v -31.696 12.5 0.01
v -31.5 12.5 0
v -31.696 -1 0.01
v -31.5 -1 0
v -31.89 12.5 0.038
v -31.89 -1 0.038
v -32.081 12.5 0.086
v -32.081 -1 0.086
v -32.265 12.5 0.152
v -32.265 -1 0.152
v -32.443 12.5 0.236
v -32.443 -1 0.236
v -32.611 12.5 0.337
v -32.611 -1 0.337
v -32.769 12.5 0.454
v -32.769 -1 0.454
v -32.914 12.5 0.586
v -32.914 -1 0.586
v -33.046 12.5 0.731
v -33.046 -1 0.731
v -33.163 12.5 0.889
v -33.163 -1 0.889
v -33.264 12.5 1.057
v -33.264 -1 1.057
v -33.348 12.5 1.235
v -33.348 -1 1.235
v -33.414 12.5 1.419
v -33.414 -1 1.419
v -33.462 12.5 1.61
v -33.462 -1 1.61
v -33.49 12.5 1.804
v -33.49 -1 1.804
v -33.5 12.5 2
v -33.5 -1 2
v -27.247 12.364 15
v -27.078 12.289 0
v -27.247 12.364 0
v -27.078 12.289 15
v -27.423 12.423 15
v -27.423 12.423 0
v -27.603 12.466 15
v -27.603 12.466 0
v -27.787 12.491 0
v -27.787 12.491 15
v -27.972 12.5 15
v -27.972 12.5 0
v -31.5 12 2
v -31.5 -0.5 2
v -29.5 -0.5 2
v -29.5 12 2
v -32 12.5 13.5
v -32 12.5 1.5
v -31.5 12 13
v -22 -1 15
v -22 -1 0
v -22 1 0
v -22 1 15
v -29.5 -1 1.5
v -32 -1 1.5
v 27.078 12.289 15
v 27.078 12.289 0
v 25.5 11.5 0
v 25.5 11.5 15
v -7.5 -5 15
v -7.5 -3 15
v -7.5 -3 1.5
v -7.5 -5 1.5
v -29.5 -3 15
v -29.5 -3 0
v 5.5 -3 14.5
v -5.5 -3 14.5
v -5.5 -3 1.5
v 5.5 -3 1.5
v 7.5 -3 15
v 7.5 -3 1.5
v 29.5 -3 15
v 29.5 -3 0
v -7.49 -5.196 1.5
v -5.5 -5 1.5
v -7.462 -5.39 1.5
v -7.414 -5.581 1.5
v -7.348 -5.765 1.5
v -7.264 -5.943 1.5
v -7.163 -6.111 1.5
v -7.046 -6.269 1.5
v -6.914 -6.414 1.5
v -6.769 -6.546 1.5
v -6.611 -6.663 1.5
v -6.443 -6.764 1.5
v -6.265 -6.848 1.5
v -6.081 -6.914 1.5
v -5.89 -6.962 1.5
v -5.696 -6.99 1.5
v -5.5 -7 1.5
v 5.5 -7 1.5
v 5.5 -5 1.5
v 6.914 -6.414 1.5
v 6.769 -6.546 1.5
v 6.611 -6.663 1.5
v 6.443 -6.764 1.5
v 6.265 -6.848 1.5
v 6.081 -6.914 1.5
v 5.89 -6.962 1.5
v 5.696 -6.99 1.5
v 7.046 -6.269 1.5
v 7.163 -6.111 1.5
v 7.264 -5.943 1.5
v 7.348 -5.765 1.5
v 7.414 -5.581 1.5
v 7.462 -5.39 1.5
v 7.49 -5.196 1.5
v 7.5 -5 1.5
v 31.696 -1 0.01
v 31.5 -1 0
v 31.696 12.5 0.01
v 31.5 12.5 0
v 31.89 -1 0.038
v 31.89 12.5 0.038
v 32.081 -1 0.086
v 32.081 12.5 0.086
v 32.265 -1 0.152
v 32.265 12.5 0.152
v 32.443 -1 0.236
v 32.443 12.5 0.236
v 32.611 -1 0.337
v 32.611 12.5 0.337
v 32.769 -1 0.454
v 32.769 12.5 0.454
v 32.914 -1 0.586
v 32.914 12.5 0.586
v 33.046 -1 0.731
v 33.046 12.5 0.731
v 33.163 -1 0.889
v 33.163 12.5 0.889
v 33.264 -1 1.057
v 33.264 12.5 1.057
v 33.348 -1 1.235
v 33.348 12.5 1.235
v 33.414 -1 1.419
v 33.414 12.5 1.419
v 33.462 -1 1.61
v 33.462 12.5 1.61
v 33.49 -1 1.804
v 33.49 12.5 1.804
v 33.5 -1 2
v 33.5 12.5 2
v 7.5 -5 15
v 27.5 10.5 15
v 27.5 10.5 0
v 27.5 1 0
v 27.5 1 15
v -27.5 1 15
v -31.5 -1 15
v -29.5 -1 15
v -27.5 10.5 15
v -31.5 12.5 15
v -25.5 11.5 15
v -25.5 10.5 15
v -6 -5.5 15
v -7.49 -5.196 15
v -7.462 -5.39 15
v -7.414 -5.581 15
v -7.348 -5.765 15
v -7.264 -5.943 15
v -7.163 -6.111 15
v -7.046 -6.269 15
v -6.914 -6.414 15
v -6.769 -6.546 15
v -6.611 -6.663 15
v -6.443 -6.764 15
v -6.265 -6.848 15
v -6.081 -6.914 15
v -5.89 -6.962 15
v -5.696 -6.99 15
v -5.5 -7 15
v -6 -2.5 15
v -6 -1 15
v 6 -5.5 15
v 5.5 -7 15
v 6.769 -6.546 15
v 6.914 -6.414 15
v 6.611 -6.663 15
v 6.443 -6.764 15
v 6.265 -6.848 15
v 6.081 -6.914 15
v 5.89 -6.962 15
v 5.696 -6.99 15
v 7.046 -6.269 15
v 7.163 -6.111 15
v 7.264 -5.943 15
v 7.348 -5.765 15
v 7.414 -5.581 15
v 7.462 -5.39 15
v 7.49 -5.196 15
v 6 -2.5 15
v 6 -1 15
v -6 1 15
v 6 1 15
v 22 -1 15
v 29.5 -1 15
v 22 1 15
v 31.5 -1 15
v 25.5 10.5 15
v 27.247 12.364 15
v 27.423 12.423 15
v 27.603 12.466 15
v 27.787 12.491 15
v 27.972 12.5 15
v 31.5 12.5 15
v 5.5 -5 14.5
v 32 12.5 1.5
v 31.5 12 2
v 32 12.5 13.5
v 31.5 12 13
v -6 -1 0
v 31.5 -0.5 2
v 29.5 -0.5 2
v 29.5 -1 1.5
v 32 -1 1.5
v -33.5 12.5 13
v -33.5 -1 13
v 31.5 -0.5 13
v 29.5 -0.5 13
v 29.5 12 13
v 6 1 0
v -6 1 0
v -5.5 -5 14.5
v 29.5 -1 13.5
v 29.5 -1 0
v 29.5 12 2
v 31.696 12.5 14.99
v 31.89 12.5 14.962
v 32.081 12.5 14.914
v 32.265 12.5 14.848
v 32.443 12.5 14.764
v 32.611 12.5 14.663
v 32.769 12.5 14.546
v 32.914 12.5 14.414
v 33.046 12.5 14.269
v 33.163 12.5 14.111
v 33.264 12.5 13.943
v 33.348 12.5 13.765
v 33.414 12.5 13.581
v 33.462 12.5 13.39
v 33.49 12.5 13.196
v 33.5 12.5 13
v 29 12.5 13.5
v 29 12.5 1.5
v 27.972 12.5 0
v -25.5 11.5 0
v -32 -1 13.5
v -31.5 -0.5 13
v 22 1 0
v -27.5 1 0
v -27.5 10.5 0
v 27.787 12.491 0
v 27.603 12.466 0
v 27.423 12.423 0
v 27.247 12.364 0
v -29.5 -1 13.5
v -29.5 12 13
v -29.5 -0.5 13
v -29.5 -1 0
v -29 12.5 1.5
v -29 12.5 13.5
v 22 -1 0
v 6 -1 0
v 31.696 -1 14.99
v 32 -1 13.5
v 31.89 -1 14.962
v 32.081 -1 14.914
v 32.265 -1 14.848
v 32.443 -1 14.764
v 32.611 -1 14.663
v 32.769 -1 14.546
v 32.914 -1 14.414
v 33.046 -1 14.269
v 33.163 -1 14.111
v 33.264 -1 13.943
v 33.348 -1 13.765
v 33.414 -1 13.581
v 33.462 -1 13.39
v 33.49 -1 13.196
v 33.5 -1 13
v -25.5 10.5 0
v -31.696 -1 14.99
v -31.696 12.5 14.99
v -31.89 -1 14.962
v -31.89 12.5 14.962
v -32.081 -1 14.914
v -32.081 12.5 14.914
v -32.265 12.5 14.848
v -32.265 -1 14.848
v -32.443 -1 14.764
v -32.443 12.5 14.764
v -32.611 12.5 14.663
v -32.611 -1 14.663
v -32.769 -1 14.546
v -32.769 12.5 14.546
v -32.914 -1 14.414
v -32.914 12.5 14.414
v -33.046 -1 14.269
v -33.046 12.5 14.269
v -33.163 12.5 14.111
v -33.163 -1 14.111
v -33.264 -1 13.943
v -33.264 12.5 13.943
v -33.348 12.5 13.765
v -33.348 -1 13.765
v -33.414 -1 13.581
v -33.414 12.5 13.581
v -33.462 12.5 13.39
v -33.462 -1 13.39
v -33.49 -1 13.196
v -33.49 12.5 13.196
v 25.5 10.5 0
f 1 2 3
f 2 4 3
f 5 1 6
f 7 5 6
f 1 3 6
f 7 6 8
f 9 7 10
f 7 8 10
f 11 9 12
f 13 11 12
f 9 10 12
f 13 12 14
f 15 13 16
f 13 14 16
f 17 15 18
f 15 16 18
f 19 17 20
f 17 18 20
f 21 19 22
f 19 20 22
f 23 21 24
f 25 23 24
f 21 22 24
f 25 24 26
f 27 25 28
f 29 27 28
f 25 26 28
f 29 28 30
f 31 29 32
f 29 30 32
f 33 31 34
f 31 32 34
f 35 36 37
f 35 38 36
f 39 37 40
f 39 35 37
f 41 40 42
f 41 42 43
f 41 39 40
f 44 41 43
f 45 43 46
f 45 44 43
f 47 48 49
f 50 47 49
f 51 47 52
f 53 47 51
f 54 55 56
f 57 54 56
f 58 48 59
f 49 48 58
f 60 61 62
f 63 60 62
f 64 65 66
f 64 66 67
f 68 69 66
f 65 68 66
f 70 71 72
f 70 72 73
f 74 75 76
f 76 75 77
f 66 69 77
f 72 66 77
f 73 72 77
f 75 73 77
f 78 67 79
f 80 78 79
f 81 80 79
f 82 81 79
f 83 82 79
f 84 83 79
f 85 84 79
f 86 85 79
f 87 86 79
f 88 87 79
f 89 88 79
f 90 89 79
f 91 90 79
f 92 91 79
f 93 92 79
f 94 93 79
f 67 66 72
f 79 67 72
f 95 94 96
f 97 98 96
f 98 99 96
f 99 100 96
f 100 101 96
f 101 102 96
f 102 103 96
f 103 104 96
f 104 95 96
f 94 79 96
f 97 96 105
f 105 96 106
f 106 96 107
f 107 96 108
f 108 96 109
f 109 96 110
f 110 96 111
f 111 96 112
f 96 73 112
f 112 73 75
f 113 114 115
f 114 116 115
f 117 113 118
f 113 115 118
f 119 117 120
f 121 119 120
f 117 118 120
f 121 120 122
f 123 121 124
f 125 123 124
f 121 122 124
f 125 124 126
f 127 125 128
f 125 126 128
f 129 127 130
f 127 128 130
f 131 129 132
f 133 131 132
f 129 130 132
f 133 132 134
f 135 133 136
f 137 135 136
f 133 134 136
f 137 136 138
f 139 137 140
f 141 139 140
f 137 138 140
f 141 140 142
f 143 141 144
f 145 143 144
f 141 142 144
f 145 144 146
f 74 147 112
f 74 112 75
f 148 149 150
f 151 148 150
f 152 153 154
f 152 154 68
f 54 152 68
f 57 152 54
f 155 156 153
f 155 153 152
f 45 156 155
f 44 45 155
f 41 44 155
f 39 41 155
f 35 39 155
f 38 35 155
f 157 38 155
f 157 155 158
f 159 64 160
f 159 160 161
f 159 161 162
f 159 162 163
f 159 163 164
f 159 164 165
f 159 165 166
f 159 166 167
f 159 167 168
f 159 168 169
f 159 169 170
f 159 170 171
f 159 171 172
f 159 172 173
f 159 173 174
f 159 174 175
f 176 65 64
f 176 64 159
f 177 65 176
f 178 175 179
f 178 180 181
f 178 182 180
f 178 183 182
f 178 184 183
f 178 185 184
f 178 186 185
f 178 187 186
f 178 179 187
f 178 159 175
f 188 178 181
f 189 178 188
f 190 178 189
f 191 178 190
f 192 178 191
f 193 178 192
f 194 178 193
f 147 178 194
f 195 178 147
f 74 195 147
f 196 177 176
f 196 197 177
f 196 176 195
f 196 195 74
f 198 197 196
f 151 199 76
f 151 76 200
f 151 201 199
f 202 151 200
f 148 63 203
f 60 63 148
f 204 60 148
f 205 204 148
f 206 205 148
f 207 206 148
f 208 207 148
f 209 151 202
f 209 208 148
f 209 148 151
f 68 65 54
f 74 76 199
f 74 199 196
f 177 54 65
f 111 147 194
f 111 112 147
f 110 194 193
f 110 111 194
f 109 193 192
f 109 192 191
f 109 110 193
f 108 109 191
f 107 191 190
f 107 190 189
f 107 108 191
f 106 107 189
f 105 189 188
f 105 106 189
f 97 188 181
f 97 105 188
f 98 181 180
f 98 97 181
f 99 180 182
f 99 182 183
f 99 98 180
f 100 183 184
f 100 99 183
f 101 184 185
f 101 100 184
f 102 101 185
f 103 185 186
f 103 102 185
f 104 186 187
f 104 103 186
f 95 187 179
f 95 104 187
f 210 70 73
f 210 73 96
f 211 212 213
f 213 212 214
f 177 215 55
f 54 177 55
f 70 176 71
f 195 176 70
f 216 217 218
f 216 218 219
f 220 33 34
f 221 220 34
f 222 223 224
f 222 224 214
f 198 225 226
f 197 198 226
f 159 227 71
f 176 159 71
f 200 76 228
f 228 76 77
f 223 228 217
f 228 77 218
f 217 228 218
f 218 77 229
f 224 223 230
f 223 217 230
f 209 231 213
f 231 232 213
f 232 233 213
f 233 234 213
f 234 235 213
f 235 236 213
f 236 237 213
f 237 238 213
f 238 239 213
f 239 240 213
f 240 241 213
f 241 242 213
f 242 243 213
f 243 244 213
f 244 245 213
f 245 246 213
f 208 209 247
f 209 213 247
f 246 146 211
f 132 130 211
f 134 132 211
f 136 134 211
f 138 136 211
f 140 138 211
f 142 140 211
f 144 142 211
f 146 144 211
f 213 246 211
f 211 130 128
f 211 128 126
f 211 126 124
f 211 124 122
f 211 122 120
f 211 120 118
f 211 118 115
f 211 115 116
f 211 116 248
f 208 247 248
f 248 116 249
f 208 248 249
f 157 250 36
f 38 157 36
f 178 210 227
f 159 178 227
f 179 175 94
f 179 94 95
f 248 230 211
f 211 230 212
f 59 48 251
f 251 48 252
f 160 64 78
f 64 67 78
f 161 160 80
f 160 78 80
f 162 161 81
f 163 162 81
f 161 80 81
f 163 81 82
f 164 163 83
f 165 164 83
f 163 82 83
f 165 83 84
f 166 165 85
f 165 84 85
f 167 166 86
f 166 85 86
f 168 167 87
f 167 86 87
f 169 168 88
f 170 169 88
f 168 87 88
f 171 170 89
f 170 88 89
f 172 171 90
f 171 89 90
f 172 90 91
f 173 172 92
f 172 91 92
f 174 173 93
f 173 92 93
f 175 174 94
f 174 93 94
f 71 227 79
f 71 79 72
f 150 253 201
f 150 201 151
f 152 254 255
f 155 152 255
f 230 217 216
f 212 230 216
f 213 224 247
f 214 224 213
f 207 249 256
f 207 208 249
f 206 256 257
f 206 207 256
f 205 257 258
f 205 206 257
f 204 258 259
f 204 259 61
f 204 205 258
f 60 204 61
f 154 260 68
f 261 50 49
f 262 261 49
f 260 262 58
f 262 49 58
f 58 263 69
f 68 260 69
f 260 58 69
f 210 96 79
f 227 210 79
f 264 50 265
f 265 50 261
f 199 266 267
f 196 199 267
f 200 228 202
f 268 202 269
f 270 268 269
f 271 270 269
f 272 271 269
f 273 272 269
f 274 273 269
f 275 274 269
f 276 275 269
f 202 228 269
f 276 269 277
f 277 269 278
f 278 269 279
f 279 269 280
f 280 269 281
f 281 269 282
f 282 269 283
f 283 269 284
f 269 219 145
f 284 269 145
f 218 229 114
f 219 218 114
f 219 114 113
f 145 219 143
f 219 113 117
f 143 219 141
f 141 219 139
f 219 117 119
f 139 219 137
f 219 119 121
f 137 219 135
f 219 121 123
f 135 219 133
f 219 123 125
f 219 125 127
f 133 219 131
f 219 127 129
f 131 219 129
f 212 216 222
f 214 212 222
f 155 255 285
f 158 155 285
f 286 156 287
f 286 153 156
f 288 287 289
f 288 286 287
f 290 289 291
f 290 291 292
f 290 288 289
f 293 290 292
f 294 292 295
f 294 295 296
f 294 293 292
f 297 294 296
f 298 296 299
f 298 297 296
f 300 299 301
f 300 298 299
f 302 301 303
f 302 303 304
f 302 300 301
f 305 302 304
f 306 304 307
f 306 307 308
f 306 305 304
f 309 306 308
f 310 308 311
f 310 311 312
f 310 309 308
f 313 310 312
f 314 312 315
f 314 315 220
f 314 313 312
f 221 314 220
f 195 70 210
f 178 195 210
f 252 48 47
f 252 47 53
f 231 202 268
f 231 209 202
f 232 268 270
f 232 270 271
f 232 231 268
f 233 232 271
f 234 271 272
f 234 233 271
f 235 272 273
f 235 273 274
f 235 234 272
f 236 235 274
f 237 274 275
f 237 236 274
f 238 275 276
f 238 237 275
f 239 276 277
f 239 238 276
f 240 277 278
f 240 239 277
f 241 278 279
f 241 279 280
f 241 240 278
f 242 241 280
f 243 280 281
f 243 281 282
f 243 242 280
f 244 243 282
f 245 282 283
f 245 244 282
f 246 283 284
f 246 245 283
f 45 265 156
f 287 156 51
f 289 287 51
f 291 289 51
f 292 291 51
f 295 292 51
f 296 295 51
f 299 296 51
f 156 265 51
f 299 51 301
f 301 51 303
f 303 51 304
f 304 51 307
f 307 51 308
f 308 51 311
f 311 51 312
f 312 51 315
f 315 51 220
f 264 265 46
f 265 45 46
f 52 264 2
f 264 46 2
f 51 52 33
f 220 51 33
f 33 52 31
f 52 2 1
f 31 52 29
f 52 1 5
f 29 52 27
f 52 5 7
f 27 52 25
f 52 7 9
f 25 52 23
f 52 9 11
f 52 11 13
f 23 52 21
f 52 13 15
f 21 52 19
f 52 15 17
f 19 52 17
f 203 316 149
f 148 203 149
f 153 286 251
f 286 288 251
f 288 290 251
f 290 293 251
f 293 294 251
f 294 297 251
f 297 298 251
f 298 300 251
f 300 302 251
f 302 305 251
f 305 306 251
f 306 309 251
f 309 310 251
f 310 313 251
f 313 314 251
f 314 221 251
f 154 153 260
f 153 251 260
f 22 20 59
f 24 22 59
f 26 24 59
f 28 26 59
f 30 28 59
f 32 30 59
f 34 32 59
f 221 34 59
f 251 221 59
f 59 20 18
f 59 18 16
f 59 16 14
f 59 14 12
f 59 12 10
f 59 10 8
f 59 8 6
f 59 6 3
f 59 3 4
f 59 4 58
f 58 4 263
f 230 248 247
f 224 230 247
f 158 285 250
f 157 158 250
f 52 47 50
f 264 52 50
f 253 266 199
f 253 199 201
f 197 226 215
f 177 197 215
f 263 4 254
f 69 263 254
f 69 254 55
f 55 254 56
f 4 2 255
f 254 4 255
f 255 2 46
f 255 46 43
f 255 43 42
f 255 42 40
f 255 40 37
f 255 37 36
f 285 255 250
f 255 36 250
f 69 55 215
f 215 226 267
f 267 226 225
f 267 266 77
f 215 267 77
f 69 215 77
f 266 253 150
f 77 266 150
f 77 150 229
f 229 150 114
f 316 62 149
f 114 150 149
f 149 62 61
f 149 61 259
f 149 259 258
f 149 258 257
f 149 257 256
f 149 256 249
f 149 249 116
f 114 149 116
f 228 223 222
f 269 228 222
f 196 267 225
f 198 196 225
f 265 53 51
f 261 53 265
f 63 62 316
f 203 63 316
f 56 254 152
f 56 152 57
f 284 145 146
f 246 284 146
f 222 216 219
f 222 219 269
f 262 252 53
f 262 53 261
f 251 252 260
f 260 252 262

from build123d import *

# Parameters (mm, degrees)
F0_W     = 5.5
F0_H     = 2
F1_DEPTH = 15
F2_W     = 2
F2_H     = 11
F3_DEPTH = 13.501
F4_W     = 2
F4_H     = 2
F5_DEPTH = 13.5
F6_R     = 2
F7_SIZE  = 0.5


with BuildPart() as f1:
    # F0 (on Top) → F1 (new body)
    with BuildSketch(Plane.XY):
        Polygon((29.5, -1), (27.5, -1), (22, -1), (6, -1), (0, -1), (0, -3), (29.5, -3), align=None)
        with Locations((24.75, 0)):
            Rectangle(F0_W, F0_H)
        Polygon((27.5, 1), (27.5, -1), (29.5, -1), (29.5, 10.5), (27.5, 10.5), align=None)
        Polygon((29.5, 10.5), (29.5, -1), (33.5, -1), (33.5, 12.5), (29.5, 12.5), align=None)
        Polygon((0, -1), (6, -1), (6, 1), (-6, 1), (-6, -1), align=None)
        Polygon((25.5, 10.5), (27.5, 10.5), (29.5, 10.5), (29.5, 12.5), (27.5, 12.5), (25.5, 11.5), align=None)
        Polygon((0, -3), (0, -1), (-6, -1), (-22, -1), (-27.5, -1), (-29.5, -1), (-29.5, -3), align=None)
        with Locations((-24.75, 0)):
            Rectangle(F0_W, F0_H)
        Polygon((-29.5, 10.5), (-29.5, -1), (-27.5, -1), (-27.5, 1), (-27.5, 10.5), align=None)
        Polygon((-33.5, -1), (-29.5, -1), (-29.5, 10.5), (-29.5, 12.5), (-33.5, 12.5), align=None)
        Polygon((-29.5, 12.5), (-29.5, 10.5), (-27.5, 10.5), (-25.5, 10.5), (-25.5, 11.5), (-27.5, 12.5), align=None)
    extrude(amount=F1_DEPTH)

    # F2 (on face) → F3 (cut, through all)
    with BuildSketch(Plane.XZ.offset(1)):
        with Locations((-30.5, 7.5)):
            Rectangle(F2_W, F2_H)
        with Locations((30.5, 7.5)):
            Rectangle(F2_W, F2_H)
    extrude(amount=-F3_DEPTH, mode=Mode.SUBTRACT)

    # F4 (on face) → F5 (join)
    with BuildSketch(Plane.XY.offset(15)):
        with Locations((-6.5, -4)):
            Rectangle(F4_W, F4_H)
        Polygon((7.5, -7), (7.5, -3), (5.5, -3), (5.5, -5), (-5.5, -5), (-7.5, -5), (-7.5, -7), align=None)
    extrude(amount=-F5_DEPTH)

    # F6
    f6_edges = [f1.edges().sort_by_distance(p)[0] for p in [
        (33.5, 5.75, 15),
        (-33.5, 5.75, 15),
        (33.5, 5.75, 0),
        (-33.5, 5.75, 0),
        (-27.5, 12.5, 7.5),
        (27.5, 12.5, 7.5),
        (-7.5, -7, 8.25),
        (7.5, -7, 8.25),
    ]]
    fillet(f6_edges, radius=F6_R)

    # F7
    f7_edges = [f1.edges().sort_by_distance(p)[0] for p in [
        (-31.5, -1, 7.5),
        (-30.5, -1, 13),
        (-30.5, -1, 2),
        (31.5, -1, 7.5),
        (30.5, -1, 13),
        (30.5, -1, 2),
        (31.5, 12.5, 7.5),
        (30.5, 12.5, 2),
        (29.5, 12.5, 7.5),
        (30.5, 12.5, 13),
        (-30.5, 12.5, 2),
        (-29.5, 12.5, 7.5),
        (-31.5, 12.5, 7.5),
        (-30.5, 12.5, 13),
        (0, -3, 15),
        (-5.5, -4, 15),
        (0, -5, 15),
        (5.5, -4, 15),
    ]]
    chamfer(f7_edges, length=F7_SIZE)


solid = f1.part
